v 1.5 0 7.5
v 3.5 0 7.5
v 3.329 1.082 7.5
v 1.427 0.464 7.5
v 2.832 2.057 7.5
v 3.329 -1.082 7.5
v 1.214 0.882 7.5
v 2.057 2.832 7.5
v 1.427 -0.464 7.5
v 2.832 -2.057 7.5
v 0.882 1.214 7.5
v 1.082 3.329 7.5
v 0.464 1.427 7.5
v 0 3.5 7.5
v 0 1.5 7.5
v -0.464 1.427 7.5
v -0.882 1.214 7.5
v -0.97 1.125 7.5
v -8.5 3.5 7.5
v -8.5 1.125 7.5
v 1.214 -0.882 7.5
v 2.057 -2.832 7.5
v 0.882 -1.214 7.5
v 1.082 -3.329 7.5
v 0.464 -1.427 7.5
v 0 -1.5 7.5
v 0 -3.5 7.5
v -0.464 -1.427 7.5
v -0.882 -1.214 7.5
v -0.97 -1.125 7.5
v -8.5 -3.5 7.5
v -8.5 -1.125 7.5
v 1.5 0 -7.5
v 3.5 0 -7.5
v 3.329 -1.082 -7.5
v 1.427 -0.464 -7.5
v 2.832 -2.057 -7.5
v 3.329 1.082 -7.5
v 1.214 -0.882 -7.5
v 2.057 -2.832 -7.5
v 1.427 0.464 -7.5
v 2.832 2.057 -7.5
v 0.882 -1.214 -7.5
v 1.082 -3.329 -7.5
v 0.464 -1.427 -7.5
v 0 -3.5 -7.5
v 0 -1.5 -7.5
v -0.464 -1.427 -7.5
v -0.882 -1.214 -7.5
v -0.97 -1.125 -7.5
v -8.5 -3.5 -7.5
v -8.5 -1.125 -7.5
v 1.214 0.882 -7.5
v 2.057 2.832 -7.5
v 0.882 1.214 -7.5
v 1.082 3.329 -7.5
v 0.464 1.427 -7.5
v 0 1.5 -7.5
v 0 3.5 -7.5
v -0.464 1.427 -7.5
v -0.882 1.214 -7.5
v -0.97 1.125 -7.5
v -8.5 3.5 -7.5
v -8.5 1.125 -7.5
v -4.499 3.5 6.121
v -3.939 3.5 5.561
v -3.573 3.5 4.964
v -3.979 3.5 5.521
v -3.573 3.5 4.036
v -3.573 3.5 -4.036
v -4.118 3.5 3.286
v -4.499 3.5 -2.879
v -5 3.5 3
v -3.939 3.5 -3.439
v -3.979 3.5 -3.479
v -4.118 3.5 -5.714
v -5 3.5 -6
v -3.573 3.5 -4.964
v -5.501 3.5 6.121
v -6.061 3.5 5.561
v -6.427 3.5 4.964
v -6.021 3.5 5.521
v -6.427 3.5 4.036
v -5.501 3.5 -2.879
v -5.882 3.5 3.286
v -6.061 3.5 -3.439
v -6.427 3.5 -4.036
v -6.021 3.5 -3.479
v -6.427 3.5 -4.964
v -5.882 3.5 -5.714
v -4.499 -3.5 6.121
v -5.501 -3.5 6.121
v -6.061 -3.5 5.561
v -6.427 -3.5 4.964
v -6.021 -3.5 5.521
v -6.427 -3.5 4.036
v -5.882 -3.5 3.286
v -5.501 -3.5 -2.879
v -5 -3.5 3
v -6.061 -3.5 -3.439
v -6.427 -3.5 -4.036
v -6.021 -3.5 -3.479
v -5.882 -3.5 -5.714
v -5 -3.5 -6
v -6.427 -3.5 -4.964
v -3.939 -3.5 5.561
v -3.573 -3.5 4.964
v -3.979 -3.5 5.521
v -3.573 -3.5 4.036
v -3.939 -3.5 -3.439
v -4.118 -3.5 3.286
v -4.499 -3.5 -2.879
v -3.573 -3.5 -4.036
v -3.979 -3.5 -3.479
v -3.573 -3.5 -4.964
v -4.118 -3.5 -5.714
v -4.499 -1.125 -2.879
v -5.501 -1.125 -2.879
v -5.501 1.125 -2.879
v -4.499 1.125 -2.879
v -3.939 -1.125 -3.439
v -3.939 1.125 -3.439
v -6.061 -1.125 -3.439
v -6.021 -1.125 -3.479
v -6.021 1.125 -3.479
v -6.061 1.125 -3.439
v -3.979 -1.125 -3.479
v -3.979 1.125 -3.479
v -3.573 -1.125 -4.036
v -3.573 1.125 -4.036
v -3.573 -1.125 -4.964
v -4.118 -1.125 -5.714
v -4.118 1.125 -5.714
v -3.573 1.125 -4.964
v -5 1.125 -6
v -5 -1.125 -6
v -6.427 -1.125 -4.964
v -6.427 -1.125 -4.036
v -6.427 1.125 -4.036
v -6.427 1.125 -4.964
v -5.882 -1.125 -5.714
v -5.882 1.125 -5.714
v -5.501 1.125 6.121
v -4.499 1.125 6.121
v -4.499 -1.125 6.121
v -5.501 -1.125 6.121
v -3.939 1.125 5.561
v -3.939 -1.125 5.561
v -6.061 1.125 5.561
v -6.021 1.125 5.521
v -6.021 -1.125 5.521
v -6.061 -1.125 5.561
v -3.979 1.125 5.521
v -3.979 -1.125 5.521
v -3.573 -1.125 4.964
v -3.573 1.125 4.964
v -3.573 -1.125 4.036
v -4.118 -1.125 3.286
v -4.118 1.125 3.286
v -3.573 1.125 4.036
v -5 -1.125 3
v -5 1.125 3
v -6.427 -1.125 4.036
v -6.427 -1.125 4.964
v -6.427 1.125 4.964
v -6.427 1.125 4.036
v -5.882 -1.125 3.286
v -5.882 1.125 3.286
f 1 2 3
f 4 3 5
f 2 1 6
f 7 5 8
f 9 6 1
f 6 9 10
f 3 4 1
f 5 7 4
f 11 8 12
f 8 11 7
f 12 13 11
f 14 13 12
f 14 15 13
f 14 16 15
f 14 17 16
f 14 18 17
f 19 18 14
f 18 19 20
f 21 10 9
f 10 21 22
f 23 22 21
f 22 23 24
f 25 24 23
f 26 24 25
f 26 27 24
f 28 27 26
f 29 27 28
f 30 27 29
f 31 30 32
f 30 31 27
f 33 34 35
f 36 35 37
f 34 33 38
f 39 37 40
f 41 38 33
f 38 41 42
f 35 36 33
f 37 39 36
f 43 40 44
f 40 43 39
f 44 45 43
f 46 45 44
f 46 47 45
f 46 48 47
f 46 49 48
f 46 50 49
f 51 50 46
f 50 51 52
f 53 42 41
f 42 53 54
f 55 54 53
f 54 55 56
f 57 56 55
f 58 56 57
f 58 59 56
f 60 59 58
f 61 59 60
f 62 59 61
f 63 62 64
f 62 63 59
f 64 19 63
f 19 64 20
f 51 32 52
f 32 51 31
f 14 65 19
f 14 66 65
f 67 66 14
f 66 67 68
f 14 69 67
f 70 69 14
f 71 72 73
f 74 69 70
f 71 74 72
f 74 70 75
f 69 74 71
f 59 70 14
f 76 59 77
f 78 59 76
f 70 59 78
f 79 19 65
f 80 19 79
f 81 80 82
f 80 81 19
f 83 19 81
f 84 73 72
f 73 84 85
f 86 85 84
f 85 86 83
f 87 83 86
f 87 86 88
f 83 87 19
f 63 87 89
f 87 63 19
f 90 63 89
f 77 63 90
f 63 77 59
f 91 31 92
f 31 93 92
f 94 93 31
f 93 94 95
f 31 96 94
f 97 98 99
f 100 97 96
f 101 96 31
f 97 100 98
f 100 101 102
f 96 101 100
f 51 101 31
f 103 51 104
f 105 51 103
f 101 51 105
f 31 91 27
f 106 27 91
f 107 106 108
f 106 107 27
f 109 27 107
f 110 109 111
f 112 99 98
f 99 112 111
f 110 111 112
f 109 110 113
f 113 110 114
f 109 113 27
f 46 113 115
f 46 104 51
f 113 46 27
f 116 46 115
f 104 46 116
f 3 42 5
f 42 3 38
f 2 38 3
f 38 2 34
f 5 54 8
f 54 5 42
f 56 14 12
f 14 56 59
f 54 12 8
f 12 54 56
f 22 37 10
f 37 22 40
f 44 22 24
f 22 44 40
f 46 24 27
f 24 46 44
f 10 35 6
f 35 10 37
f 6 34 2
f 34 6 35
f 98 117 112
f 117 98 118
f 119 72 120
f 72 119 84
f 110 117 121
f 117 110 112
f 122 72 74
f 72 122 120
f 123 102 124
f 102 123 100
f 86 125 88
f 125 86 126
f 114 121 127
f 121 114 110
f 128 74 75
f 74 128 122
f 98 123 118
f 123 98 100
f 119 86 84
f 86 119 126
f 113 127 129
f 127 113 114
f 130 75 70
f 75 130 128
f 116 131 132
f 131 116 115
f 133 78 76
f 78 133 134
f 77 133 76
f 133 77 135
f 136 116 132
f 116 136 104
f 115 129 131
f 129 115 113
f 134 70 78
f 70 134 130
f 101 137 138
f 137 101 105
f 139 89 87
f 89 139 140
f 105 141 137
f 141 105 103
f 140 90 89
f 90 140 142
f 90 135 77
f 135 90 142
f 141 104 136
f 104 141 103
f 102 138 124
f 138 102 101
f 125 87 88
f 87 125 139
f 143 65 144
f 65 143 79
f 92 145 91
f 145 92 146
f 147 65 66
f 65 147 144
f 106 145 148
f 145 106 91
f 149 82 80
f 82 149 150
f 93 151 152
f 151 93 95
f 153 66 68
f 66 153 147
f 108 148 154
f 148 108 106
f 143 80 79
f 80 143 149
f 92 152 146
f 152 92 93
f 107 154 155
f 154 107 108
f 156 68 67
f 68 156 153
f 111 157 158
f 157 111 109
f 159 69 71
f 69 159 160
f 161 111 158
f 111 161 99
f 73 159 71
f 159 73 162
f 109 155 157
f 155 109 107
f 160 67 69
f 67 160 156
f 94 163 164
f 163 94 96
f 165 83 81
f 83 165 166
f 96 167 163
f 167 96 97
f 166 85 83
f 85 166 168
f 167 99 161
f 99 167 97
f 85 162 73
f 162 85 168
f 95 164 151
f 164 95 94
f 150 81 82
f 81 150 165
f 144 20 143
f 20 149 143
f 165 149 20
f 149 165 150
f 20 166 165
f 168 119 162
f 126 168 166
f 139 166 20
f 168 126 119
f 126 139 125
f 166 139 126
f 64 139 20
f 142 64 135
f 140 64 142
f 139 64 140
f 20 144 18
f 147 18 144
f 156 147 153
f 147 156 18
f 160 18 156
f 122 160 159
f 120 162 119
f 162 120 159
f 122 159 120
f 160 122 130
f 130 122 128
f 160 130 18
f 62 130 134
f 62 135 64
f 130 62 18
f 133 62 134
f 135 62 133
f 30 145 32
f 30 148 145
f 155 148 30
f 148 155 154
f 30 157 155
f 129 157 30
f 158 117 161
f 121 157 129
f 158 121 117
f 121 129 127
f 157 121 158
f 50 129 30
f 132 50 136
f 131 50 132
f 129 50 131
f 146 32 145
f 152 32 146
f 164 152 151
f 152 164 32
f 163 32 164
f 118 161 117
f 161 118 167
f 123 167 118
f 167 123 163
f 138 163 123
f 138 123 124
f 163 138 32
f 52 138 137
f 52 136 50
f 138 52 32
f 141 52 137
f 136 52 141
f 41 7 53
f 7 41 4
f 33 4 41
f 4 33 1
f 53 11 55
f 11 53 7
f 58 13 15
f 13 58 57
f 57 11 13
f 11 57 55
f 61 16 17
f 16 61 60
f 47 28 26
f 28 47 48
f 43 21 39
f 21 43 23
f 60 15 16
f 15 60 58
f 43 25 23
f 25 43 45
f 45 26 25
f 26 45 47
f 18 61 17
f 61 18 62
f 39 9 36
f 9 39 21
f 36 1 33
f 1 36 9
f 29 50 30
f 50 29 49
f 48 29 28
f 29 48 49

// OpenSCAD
// file: parameters.scad
// Parameters file for RepRap Huxley (and maybe Mendel)

// Set ONE OF these true.

huxley=true;
mendel=!huxley;



pi=3.14159265;

// The relative location in your file system where the .dxf files are
// DXFs are for quick development.  They should be replaced by parameterised CSG in due course.

fileroot="Design-drawings/";

rodsize = 6;	//threaded/smooth rod diameter in mm
xaxis = 182.5;	//width of base in mm
yaxis = 266.5;	//length of base in mm


screwsize = 3;	//bearing bore/screw diameter in mm
bearingsize = 10;	//outer diameter of bearings in mm
bearingwidth = 4;	//width of bearings in mm


rodpitch = rodsize / 6;
rodnutsize = 0.8 * rodsize;
rodnutdiameter = 1.9 * rodsize;
rodwashersize = 0.2 * rodsize;
rodwasherdiameter = 2 * rodsize;
screwpitch = screwsize / 6;
nutsize = 0.8 * screwsize;
nutdiameter = 1.9 * screwsize;
pentanutradius=1.04*screwsize;
washersize = 0.2 * screwsize;
washerdiameter = 2 * screwsize;
partthick = 2 * rodsize;
vertexrodspace = 2 * rodsize;


c = [0.3, 0.3, 0.3];
rodendoffset = rodnutsize + rodwashersize * 2 + partthick / 2;
vertexoffset = vertexrodspace + rodendoffset;


renderrodthreads = false;
renderscrewthreads = false;
fn = 36;

// The gap between the joining rods at a vertex

vertex_radius=sqrt(rodsize*rodsize + vertexoffset*vertexoffset);
vertex_ang = atan(vertexoffset/rodsize)-30;
vertex_gap = 2*vertex_radius*cos(vertex_ang);

// Nema 17 dimensions - these are absolute

nema17_square=42;
nema17_screws=31;
nema17_screw_r=1.5;
nema17_hub=22;
nema17_hub_depth=2;
nema17_length=36;
nema17_shaft=5;
nema17_shaft_length=55;
nema17_shaft_projection=22;

// Nema 14 dimensions - these are absolute

nema14_square=35.3;
nema14_screws=26;
nema14_screw_r=1.5;
nema14_hub=22;
nema14_hub_depth=2;
nema14_length=36;
nema14_shaft=5;
nema14_shaft_length=66;
nema14_shaft_projection=19;

// Nema 11 dimensions - these are absolute

nema11_square=28.5;
nema11_screws=23;
nema11_screw_r=1.25;
nema11_hub=22;
nema11_hub_depth=2;
nema11_length=44.5;
nema11_shaft=5;
nema11_shaft_length=78;
nema11_shaft_projection=18;

// Limit switch parameters

limit_switch_hole_diameter=2.5;
limit_switch_centres=9.5;

// The RepRap slide bearings

bearing_mount_centres=18;
bearing_width=7;
bearing_depth=18;

// X axis parameters - many should be relative

x_bar_gap=30;
motor_center_y = 26;
bar_clamp_x=5;
bar_clamp_y=8;
bar_clamp_x_gap=23;
bearing_y=50;
bearing_x=bar_clamp_x_gap + 10;
hole_land=4;
thickness=5;
bearing_low_z = 8;
bearing_z_gap = 25;
bearing_plate_width = bearing_mount_centres+2*hole_land + 10;
bearing_plate_overlap=0.5;
bearing_plate_support=10;
// main file
include <parameters.scad>;
use <library.scad>;

module cylinder_clamp(hole_offset = 8, c_screw = 3, clamped = 6, thickness = 8, screw_gap = 0)
{
	difference()
	{
		union()
		{
			translate([-(hole_offset+c_screw/2+2)/2,0,0])
				cube([hole_offset+c_screw/2+2, clamped+4, thickness], center=true);
			cylinder(h=thickness, r = clamped/2+2, center=true, $fn=20);
		}
		
		translate([-(hole_offset+c_screw/2+2)/2,0,0])
			cube([(hole_offset+c_screw/2+2)+1, clamped*0.75, thickness+1], center=true);
		cylinder(h=thickness, r = clamped/2, center=true, $fn=20);
		if(screw_gap==0)
		{
			translate([-hole_offset,0,0])
				rotate([90,0,0])
					teardrop(h=2*thickness, r =c_screw/2, center=true, teardrop_angle=270, truncateMM=0.5);
		} else
		{
			for(z=[-1,1])
				translate([-hole_offset,0,z*screw_gap/2])
					rotate([90,0,0])
						teardrop(h=2*thickness, r =c_screw/2, center=true, teardrop_angle=270, truncateMM=0.5);
		}
	}
}


// For Sanguinololu:

//cylinder_clamp(hole_offset = 8, c_screw = 3, clamped = 6, thickness = 8, screw_gap = 0); // 2 off
//cylinder_clamp(hole_offset = 16, c_screw = 3, clamped = 6, thickness = 8, screw_gap = 0); // 1 off

// For X cable holder on the z_top_clamp

cylinder_clamp(hole_offset = 5, c_screw = 3, clamped = 3, thickness = rodsize+3*screwsize, screw_gap = rodsize+screwsize);
